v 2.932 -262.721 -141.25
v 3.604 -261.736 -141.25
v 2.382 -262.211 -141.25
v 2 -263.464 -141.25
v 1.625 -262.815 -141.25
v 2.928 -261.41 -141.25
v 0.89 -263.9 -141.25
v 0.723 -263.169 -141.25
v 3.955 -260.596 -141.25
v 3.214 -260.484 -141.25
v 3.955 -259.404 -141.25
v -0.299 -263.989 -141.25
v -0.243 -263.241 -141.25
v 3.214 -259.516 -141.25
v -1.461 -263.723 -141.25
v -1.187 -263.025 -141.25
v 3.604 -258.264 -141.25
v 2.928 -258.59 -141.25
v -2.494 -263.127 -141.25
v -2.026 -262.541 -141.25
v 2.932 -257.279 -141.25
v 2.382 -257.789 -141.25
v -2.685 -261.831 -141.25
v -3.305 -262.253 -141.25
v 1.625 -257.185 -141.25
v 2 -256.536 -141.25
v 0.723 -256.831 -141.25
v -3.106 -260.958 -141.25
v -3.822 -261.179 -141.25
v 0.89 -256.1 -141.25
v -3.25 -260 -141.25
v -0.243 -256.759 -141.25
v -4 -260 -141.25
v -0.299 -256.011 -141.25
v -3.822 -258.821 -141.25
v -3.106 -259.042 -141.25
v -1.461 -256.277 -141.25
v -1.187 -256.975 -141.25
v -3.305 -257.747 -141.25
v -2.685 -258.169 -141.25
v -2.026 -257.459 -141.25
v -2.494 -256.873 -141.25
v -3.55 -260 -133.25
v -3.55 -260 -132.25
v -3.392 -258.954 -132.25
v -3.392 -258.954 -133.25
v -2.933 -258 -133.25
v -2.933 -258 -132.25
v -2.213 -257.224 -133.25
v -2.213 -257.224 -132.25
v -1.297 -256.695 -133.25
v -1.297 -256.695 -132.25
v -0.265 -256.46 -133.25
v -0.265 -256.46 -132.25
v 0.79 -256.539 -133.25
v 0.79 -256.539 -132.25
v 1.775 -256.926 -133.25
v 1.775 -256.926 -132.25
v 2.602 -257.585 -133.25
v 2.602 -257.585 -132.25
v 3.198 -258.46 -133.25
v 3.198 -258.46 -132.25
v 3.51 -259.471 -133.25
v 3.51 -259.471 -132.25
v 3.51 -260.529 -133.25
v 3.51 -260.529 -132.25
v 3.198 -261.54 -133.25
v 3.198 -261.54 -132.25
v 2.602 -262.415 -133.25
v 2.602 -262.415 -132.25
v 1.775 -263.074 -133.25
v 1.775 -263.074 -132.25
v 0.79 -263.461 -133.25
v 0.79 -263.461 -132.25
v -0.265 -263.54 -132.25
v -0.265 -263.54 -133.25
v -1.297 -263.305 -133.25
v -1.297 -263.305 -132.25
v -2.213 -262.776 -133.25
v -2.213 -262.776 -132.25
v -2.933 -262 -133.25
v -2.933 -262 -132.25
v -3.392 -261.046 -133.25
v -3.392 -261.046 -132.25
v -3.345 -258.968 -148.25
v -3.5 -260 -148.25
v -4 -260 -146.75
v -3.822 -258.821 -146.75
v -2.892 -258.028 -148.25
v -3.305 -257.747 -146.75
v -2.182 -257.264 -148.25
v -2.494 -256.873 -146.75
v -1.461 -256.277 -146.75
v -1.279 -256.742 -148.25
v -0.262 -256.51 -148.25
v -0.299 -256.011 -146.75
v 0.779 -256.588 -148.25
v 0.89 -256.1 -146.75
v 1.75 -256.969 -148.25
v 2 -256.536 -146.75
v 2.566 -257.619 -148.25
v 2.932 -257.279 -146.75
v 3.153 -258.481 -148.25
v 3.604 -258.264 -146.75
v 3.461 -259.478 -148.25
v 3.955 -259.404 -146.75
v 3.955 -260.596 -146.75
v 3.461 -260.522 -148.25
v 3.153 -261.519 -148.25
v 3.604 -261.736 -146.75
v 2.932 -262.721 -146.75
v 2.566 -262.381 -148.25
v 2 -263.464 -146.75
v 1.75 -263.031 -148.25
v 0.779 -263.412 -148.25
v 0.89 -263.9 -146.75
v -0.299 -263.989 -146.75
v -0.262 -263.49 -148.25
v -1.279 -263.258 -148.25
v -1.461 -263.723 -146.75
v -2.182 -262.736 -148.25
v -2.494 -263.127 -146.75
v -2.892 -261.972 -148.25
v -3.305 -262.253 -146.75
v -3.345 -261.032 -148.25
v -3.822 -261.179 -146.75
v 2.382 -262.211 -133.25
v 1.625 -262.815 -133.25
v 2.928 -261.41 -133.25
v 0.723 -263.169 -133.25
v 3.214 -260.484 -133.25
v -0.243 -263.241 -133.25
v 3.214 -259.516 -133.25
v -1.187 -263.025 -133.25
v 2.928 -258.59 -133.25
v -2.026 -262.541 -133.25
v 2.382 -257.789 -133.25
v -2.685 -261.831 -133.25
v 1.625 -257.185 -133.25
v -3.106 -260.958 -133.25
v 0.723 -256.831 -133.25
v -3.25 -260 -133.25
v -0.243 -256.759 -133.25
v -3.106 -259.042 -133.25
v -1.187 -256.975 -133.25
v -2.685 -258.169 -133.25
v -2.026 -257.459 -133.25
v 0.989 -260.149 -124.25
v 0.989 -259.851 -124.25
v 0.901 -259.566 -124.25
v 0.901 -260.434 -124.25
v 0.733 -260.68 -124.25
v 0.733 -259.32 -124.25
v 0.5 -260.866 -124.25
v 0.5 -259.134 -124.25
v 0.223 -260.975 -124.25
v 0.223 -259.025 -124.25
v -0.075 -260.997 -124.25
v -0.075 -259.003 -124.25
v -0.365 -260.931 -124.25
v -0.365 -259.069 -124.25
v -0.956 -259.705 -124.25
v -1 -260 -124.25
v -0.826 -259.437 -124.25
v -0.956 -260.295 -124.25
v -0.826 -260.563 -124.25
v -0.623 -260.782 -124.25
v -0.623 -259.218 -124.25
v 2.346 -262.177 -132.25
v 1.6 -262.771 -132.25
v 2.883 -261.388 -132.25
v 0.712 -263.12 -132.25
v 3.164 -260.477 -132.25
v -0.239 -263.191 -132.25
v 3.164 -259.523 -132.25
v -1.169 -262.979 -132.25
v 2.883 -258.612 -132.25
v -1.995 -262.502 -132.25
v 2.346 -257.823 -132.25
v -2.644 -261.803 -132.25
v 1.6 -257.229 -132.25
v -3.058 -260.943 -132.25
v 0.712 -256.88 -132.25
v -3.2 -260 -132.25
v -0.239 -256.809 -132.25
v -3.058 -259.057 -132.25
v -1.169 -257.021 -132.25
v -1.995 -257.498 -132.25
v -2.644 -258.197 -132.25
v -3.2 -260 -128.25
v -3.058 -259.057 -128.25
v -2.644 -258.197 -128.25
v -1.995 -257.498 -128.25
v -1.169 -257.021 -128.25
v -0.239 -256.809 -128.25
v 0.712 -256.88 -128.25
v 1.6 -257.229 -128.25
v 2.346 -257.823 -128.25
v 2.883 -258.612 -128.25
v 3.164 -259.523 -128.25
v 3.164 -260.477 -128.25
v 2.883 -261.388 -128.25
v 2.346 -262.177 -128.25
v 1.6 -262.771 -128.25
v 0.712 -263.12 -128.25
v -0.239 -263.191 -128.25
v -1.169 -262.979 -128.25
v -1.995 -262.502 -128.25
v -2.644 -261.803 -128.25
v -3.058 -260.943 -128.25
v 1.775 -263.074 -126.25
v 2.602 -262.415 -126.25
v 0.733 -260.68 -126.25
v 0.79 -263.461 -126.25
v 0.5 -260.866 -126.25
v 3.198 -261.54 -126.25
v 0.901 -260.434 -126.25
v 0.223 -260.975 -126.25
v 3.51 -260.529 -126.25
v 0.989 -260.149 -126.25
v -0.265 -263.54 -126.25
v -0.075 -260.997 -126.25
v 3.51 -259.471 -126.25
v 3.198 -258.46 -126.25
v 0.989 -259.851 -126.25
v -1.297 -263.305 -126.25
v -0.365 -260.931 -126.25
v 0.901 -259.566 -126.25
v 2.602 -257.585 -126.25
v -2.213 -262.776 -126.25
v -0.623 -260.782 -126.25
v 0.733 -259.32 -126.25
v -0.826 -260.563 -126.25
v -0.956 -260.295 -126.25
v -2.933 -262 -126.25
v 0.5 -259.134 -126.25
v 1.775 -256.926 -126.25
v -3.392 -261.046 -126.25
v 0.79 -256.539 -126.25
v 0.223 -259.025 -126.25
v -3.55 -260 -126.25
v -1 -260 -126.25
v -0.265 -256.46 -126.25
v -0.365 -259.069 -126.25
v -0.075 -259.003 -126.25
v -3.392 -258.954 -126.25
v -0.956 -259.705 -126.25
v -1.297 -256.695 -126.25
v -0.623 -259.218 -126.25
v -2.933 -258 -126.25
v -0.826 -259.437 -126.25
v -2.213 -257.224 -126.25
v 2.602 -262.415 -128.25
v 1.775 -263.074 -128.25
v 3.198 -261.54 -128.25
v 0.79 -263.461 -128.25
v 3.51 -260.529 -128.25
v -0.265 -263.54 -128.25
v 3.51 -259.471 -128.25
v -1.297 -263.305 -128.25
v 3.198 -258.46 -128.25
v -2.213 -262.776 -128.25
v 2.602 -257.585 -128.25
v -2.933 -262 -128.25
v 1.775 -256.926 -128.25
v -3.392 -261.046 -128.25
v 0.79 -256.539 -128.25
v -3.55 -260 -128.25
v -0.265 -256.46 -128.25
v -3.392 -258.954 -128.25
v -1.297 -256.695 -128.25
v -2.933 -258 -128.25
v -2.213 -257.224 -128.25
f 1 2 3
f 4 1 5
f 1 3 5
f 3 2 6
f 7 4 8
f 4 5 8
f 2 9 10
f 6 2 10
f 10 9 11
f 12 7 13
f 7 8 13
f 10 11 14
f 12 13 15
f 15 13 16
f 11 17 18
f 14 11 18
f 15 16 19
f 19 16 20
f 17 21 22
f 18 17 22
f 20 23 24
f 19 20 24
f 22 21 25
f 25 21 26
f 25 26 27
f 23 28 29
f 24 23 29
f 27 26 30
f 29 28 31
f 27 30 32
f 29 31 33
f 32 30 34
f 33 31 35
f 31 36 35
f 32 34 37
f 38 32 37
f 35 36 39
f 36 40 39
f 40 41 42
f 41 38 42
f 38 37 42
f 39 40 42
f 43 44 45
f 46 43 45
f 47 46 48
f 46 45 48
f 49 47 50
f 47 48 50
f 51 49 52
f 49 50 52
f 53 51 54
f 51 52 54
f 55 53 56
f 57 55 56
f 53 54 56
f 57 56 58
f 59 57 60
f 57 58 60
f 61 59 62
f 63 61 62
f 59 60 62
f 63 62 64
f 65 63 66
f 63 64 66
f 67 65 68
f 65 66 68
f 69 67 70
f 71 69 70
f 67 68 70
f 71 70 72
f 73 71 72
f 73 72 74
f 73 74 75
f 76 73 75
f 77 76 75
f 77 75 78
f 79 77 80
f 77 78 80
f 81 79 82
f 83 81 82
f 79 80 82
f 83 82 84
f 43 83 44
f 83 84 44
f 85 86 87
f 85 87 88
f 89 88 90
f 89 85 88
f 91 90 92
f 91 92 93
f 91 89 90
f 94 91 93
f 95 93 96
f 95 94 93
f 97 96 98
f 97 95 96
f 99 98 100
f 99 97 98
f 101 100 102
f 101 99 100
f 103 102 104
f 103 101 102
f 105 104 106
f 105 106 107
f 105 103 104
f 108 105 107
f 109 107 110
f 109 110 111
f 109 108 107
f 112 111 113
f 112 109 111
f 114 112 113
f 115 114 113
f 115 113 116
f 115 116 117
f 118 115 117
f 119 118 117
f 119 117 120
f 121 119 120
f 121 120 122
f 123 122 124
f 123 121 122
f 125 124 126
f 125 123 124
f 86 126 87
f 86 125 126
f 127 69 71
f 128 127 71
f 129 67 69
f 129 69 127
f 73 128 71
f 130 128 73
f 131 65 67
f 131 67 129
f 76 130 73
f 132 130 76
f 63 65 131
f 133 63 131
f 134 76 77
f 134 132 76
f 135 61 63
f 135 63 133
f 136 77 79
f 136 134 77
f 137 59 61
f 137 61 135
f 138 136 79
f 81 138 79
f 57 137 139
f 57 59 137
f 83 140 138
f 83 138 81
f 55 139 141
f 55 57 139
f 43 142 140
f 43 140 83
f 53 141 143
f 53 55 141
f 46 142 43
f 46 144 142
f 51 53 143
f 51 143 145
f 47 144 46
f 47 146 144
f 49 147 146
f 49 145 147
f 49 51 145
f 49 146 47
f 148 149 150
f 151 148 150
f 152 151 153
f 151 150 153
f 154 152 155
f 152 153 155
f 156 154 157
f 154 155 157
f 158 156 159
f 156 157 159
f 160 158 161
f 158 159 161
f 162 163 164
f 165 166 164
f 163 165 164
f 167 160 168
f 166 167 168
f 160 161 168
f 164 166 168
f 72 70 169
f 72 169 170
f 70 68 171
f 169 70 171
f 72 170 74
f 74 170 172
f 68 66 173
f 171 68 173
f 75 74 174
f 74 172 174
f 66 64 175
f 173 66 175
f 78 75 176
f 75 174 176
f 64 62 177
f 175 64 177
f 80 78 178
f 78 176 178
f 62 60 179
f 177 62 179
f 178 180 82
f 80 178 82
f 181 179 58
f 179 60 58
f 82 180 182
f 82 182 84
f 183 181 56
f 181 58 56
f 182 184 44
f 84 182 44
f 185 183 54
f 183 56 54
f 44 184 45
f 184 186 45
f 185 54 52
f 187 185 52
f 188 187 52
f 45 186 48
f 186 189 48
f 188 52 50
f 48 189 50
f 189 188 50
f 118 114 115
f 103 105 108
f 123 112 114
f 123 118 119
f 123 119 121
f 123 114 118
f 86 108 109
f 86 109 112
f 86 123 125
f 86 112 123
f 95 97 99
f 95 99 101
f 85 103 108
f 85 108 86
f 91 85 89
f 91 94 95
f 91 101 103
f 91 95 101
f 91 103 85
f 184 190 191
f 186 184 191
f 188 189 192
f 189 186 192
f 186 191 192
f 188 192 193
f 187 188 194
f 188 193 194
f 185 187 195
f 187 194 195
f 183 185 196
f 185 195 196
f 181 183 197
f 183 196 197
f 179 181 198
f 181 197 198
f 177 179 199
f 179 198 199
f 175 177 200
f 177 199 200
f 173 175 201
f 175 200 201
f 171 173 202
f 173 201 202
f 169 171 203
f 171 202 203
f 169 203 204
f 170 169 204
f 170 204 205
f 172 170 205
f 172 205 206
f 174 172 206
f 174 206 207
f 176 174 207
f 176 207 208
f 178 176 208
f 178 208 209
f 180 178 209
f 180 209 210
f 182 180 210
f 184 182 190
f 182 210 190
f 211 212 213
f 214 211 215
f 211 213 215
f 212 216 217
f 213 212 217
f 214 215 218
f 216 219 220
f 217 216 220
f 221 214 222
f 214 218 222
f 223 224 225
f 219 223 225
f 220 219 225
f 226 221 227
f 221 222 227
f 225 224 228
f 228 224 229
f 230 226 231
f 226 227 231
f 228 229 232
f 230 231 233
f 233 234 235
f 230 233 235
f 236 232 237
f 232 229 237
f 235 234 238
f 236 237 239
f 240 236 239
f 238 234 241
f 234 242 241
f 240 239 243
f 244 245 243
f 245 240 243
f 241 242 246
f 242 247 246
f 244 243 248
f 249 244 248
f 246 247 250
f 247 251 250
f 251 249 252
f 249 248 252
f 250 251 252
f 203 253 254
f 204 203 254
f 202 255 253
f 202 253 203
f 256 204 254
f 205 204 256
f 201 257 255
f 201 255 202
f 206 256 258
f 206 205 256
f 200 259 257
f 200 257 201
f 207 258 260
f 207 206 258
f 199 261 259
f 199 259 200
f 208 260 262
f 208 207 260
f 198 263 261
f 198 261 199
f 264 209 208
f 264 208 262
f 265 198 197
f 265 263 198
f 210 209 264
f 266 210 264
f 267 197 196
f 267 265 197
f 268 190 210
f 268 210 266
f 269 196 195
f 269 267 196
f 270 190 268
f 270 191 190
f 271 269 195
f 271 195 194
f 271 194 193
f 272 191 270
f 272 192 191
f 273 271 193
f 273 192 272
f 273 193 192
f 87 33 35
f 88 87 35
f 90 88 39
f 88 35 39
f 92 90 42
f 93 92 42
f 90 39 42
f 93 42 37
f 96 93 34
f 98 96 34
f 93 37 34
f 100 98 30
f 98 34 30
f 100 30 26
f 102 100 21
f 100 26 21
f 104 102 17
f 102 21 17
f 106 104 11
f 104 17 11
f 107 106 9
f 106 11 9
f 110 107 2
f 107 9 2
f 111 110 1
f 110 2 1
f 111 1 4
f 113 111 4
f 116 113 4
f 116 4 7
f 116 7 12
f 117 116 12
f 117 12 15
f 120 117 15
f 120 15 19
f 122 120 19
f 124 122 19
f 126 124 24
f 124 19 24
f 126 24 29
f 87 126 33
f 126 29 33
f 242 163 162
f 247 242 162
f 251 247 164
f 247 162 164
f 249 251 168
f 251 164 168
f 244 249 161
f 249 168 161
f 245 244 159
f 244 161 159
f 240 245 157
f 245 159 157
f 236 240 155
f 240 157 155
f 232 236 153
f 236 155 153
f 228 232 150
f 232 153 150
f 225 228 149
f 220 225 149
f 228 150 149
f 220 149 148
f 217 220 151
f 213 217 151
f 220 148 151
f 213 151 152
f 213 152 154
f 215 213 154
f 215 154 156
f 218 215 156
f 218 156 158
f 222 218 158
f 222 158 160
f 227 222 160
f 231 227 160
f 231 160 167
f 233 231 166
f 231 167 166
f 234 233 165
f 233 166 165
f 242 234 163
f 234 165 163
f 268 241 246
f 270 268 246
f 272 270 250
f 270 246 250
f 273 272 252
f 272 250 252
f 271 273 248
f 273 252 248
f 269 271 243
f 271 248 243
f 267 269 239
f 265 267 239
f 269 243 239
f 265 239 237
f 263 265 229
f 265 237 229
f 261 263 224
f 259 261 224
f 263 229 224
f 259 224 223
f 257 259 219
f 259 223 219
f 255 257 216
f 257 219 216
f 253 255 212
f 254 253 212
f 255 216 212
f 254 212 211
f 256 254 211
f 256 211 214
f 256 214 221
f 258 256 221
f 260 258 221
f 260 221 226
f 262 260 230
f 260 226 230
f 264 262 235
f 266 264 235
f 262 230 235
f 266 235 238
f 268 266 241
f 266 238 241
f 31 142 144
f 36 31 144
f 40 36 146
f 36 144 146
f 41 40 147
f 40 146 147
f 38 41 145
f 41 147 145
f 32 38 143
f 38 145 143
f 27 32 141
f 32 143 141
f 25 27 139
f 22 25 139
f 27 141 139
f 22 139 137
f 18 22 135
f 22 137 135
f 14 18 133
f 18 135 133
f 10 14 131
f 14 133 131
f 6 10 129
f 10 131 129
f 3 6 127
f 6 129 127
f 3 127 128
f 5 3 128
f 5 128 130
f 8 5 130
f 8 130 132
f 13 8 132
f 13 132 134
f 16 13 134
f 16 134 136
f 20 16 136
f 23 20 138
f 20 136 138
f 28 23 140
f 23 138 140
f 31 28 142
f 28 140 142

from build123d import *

# Parameters (mm, degrees)
CYLINDER189_R             = 3.2
CYLINDER189_DEPTH         = 22
CYLINDER190_R             = 3.55
CYLINDER190_DEPTH         = 2
CYLINDER191_R             = 3.55
CYLINDER191_DEPTH         = 1
CYLINDER192_R             = 3.25
CYLINDER192_DEPTH         = 8
CYLINDER193_R             = 4
CYLINDER193_DEPTH         = 5.5
CYLINDER194_R             = 1
CYLINDER194_DEPTH         = 2
FUSION127_PLACEMENT_ANGLE = 180


with BuildPart() as cylinder189:
    # Cylinder189 → Cylinder189 (new body)
    with BuildSketch(Plane.XY.offset(5)):
        Circle(CYLINDER189_R)
    extrude(amount=CYLINDER189_DEPTH)


with BuildPart() as cylinder190:
    # Cylinder190 → Cylinder190 (new body)
    with BuildSketch(Plane.XY.offset(5)):
        Circle(CYLINDER190_R)
    extrude(amount=CYLINDER190_DEPTH)


with BuildPart() as cylinder191:
    # Cylinder191 → Cylinder191 (new body)
    with BuildSketch(Plane.XY.offset(11)):
        Circle(CYLINDER191_R)
    extrude(amount=CYLINDER191_DEPTH)


with BuildPart() as cylinder192:
    # Cylinder192 → Cylinder192 (new body)
    with BuildSketch(Plane.XY.offset(12)):
        Circle(CYLINDER192_R)
    extrude(amount=CYLINDER192_DEPTH)


with BuildPart() as cylinder193:
    # Cylinder193 → Cylinder193 (new body)
    with BuildSketch(Plane.XY.offset(20)):
        Circle(CYLINDER193_R)
    extrude(amount=CYLINDER193_DEPTH)


with BuildPart() as fusion126:
    # Cone001 → Cone001 (revolve)
    with BuildSketch(Plane(origin=(0, 0, 25.5), x_dir=(1, 0, 0), z_dir=(0, -1, 0))):
        Polygon((0, 0), (4, 0), (3.5, 1.5), (0, 1.5), align=None)
    revolve(axis=Axis((0, 0, 25.5), (0, 0, 1)))

    # Fusion126: union Cylinder189, Cylinder190, Cylinder191, Cylinder192, Cylinder193
    add(cylinder189.part)
    add(cylinder190.part)
    add(cylinder191.part)
    add(cylinder192.part)
    add(cylinder193.part)


with BuildPart() as mic001:
    # Cylinder194 → Cylinder194 (new body)
    with BuildSketch(Plane.XY.offset(3)):
        Circle(CYLINDER194_R)
    extrude(amount=CYLINDER194_DEPTH)

    # Fusion127: union Fusion126
    add(fusion126.part)


with BuildPart() as mic001_1:
    # Fusion127 placement: moved
    add(mic001.part.moved(Location((0, -260, -121.25))).rotate(Axis((0, -260, -121.25), (0, 1, 0)), FUSION127_PLACEMENT_ANGLE))


solid = mic001_1.part
